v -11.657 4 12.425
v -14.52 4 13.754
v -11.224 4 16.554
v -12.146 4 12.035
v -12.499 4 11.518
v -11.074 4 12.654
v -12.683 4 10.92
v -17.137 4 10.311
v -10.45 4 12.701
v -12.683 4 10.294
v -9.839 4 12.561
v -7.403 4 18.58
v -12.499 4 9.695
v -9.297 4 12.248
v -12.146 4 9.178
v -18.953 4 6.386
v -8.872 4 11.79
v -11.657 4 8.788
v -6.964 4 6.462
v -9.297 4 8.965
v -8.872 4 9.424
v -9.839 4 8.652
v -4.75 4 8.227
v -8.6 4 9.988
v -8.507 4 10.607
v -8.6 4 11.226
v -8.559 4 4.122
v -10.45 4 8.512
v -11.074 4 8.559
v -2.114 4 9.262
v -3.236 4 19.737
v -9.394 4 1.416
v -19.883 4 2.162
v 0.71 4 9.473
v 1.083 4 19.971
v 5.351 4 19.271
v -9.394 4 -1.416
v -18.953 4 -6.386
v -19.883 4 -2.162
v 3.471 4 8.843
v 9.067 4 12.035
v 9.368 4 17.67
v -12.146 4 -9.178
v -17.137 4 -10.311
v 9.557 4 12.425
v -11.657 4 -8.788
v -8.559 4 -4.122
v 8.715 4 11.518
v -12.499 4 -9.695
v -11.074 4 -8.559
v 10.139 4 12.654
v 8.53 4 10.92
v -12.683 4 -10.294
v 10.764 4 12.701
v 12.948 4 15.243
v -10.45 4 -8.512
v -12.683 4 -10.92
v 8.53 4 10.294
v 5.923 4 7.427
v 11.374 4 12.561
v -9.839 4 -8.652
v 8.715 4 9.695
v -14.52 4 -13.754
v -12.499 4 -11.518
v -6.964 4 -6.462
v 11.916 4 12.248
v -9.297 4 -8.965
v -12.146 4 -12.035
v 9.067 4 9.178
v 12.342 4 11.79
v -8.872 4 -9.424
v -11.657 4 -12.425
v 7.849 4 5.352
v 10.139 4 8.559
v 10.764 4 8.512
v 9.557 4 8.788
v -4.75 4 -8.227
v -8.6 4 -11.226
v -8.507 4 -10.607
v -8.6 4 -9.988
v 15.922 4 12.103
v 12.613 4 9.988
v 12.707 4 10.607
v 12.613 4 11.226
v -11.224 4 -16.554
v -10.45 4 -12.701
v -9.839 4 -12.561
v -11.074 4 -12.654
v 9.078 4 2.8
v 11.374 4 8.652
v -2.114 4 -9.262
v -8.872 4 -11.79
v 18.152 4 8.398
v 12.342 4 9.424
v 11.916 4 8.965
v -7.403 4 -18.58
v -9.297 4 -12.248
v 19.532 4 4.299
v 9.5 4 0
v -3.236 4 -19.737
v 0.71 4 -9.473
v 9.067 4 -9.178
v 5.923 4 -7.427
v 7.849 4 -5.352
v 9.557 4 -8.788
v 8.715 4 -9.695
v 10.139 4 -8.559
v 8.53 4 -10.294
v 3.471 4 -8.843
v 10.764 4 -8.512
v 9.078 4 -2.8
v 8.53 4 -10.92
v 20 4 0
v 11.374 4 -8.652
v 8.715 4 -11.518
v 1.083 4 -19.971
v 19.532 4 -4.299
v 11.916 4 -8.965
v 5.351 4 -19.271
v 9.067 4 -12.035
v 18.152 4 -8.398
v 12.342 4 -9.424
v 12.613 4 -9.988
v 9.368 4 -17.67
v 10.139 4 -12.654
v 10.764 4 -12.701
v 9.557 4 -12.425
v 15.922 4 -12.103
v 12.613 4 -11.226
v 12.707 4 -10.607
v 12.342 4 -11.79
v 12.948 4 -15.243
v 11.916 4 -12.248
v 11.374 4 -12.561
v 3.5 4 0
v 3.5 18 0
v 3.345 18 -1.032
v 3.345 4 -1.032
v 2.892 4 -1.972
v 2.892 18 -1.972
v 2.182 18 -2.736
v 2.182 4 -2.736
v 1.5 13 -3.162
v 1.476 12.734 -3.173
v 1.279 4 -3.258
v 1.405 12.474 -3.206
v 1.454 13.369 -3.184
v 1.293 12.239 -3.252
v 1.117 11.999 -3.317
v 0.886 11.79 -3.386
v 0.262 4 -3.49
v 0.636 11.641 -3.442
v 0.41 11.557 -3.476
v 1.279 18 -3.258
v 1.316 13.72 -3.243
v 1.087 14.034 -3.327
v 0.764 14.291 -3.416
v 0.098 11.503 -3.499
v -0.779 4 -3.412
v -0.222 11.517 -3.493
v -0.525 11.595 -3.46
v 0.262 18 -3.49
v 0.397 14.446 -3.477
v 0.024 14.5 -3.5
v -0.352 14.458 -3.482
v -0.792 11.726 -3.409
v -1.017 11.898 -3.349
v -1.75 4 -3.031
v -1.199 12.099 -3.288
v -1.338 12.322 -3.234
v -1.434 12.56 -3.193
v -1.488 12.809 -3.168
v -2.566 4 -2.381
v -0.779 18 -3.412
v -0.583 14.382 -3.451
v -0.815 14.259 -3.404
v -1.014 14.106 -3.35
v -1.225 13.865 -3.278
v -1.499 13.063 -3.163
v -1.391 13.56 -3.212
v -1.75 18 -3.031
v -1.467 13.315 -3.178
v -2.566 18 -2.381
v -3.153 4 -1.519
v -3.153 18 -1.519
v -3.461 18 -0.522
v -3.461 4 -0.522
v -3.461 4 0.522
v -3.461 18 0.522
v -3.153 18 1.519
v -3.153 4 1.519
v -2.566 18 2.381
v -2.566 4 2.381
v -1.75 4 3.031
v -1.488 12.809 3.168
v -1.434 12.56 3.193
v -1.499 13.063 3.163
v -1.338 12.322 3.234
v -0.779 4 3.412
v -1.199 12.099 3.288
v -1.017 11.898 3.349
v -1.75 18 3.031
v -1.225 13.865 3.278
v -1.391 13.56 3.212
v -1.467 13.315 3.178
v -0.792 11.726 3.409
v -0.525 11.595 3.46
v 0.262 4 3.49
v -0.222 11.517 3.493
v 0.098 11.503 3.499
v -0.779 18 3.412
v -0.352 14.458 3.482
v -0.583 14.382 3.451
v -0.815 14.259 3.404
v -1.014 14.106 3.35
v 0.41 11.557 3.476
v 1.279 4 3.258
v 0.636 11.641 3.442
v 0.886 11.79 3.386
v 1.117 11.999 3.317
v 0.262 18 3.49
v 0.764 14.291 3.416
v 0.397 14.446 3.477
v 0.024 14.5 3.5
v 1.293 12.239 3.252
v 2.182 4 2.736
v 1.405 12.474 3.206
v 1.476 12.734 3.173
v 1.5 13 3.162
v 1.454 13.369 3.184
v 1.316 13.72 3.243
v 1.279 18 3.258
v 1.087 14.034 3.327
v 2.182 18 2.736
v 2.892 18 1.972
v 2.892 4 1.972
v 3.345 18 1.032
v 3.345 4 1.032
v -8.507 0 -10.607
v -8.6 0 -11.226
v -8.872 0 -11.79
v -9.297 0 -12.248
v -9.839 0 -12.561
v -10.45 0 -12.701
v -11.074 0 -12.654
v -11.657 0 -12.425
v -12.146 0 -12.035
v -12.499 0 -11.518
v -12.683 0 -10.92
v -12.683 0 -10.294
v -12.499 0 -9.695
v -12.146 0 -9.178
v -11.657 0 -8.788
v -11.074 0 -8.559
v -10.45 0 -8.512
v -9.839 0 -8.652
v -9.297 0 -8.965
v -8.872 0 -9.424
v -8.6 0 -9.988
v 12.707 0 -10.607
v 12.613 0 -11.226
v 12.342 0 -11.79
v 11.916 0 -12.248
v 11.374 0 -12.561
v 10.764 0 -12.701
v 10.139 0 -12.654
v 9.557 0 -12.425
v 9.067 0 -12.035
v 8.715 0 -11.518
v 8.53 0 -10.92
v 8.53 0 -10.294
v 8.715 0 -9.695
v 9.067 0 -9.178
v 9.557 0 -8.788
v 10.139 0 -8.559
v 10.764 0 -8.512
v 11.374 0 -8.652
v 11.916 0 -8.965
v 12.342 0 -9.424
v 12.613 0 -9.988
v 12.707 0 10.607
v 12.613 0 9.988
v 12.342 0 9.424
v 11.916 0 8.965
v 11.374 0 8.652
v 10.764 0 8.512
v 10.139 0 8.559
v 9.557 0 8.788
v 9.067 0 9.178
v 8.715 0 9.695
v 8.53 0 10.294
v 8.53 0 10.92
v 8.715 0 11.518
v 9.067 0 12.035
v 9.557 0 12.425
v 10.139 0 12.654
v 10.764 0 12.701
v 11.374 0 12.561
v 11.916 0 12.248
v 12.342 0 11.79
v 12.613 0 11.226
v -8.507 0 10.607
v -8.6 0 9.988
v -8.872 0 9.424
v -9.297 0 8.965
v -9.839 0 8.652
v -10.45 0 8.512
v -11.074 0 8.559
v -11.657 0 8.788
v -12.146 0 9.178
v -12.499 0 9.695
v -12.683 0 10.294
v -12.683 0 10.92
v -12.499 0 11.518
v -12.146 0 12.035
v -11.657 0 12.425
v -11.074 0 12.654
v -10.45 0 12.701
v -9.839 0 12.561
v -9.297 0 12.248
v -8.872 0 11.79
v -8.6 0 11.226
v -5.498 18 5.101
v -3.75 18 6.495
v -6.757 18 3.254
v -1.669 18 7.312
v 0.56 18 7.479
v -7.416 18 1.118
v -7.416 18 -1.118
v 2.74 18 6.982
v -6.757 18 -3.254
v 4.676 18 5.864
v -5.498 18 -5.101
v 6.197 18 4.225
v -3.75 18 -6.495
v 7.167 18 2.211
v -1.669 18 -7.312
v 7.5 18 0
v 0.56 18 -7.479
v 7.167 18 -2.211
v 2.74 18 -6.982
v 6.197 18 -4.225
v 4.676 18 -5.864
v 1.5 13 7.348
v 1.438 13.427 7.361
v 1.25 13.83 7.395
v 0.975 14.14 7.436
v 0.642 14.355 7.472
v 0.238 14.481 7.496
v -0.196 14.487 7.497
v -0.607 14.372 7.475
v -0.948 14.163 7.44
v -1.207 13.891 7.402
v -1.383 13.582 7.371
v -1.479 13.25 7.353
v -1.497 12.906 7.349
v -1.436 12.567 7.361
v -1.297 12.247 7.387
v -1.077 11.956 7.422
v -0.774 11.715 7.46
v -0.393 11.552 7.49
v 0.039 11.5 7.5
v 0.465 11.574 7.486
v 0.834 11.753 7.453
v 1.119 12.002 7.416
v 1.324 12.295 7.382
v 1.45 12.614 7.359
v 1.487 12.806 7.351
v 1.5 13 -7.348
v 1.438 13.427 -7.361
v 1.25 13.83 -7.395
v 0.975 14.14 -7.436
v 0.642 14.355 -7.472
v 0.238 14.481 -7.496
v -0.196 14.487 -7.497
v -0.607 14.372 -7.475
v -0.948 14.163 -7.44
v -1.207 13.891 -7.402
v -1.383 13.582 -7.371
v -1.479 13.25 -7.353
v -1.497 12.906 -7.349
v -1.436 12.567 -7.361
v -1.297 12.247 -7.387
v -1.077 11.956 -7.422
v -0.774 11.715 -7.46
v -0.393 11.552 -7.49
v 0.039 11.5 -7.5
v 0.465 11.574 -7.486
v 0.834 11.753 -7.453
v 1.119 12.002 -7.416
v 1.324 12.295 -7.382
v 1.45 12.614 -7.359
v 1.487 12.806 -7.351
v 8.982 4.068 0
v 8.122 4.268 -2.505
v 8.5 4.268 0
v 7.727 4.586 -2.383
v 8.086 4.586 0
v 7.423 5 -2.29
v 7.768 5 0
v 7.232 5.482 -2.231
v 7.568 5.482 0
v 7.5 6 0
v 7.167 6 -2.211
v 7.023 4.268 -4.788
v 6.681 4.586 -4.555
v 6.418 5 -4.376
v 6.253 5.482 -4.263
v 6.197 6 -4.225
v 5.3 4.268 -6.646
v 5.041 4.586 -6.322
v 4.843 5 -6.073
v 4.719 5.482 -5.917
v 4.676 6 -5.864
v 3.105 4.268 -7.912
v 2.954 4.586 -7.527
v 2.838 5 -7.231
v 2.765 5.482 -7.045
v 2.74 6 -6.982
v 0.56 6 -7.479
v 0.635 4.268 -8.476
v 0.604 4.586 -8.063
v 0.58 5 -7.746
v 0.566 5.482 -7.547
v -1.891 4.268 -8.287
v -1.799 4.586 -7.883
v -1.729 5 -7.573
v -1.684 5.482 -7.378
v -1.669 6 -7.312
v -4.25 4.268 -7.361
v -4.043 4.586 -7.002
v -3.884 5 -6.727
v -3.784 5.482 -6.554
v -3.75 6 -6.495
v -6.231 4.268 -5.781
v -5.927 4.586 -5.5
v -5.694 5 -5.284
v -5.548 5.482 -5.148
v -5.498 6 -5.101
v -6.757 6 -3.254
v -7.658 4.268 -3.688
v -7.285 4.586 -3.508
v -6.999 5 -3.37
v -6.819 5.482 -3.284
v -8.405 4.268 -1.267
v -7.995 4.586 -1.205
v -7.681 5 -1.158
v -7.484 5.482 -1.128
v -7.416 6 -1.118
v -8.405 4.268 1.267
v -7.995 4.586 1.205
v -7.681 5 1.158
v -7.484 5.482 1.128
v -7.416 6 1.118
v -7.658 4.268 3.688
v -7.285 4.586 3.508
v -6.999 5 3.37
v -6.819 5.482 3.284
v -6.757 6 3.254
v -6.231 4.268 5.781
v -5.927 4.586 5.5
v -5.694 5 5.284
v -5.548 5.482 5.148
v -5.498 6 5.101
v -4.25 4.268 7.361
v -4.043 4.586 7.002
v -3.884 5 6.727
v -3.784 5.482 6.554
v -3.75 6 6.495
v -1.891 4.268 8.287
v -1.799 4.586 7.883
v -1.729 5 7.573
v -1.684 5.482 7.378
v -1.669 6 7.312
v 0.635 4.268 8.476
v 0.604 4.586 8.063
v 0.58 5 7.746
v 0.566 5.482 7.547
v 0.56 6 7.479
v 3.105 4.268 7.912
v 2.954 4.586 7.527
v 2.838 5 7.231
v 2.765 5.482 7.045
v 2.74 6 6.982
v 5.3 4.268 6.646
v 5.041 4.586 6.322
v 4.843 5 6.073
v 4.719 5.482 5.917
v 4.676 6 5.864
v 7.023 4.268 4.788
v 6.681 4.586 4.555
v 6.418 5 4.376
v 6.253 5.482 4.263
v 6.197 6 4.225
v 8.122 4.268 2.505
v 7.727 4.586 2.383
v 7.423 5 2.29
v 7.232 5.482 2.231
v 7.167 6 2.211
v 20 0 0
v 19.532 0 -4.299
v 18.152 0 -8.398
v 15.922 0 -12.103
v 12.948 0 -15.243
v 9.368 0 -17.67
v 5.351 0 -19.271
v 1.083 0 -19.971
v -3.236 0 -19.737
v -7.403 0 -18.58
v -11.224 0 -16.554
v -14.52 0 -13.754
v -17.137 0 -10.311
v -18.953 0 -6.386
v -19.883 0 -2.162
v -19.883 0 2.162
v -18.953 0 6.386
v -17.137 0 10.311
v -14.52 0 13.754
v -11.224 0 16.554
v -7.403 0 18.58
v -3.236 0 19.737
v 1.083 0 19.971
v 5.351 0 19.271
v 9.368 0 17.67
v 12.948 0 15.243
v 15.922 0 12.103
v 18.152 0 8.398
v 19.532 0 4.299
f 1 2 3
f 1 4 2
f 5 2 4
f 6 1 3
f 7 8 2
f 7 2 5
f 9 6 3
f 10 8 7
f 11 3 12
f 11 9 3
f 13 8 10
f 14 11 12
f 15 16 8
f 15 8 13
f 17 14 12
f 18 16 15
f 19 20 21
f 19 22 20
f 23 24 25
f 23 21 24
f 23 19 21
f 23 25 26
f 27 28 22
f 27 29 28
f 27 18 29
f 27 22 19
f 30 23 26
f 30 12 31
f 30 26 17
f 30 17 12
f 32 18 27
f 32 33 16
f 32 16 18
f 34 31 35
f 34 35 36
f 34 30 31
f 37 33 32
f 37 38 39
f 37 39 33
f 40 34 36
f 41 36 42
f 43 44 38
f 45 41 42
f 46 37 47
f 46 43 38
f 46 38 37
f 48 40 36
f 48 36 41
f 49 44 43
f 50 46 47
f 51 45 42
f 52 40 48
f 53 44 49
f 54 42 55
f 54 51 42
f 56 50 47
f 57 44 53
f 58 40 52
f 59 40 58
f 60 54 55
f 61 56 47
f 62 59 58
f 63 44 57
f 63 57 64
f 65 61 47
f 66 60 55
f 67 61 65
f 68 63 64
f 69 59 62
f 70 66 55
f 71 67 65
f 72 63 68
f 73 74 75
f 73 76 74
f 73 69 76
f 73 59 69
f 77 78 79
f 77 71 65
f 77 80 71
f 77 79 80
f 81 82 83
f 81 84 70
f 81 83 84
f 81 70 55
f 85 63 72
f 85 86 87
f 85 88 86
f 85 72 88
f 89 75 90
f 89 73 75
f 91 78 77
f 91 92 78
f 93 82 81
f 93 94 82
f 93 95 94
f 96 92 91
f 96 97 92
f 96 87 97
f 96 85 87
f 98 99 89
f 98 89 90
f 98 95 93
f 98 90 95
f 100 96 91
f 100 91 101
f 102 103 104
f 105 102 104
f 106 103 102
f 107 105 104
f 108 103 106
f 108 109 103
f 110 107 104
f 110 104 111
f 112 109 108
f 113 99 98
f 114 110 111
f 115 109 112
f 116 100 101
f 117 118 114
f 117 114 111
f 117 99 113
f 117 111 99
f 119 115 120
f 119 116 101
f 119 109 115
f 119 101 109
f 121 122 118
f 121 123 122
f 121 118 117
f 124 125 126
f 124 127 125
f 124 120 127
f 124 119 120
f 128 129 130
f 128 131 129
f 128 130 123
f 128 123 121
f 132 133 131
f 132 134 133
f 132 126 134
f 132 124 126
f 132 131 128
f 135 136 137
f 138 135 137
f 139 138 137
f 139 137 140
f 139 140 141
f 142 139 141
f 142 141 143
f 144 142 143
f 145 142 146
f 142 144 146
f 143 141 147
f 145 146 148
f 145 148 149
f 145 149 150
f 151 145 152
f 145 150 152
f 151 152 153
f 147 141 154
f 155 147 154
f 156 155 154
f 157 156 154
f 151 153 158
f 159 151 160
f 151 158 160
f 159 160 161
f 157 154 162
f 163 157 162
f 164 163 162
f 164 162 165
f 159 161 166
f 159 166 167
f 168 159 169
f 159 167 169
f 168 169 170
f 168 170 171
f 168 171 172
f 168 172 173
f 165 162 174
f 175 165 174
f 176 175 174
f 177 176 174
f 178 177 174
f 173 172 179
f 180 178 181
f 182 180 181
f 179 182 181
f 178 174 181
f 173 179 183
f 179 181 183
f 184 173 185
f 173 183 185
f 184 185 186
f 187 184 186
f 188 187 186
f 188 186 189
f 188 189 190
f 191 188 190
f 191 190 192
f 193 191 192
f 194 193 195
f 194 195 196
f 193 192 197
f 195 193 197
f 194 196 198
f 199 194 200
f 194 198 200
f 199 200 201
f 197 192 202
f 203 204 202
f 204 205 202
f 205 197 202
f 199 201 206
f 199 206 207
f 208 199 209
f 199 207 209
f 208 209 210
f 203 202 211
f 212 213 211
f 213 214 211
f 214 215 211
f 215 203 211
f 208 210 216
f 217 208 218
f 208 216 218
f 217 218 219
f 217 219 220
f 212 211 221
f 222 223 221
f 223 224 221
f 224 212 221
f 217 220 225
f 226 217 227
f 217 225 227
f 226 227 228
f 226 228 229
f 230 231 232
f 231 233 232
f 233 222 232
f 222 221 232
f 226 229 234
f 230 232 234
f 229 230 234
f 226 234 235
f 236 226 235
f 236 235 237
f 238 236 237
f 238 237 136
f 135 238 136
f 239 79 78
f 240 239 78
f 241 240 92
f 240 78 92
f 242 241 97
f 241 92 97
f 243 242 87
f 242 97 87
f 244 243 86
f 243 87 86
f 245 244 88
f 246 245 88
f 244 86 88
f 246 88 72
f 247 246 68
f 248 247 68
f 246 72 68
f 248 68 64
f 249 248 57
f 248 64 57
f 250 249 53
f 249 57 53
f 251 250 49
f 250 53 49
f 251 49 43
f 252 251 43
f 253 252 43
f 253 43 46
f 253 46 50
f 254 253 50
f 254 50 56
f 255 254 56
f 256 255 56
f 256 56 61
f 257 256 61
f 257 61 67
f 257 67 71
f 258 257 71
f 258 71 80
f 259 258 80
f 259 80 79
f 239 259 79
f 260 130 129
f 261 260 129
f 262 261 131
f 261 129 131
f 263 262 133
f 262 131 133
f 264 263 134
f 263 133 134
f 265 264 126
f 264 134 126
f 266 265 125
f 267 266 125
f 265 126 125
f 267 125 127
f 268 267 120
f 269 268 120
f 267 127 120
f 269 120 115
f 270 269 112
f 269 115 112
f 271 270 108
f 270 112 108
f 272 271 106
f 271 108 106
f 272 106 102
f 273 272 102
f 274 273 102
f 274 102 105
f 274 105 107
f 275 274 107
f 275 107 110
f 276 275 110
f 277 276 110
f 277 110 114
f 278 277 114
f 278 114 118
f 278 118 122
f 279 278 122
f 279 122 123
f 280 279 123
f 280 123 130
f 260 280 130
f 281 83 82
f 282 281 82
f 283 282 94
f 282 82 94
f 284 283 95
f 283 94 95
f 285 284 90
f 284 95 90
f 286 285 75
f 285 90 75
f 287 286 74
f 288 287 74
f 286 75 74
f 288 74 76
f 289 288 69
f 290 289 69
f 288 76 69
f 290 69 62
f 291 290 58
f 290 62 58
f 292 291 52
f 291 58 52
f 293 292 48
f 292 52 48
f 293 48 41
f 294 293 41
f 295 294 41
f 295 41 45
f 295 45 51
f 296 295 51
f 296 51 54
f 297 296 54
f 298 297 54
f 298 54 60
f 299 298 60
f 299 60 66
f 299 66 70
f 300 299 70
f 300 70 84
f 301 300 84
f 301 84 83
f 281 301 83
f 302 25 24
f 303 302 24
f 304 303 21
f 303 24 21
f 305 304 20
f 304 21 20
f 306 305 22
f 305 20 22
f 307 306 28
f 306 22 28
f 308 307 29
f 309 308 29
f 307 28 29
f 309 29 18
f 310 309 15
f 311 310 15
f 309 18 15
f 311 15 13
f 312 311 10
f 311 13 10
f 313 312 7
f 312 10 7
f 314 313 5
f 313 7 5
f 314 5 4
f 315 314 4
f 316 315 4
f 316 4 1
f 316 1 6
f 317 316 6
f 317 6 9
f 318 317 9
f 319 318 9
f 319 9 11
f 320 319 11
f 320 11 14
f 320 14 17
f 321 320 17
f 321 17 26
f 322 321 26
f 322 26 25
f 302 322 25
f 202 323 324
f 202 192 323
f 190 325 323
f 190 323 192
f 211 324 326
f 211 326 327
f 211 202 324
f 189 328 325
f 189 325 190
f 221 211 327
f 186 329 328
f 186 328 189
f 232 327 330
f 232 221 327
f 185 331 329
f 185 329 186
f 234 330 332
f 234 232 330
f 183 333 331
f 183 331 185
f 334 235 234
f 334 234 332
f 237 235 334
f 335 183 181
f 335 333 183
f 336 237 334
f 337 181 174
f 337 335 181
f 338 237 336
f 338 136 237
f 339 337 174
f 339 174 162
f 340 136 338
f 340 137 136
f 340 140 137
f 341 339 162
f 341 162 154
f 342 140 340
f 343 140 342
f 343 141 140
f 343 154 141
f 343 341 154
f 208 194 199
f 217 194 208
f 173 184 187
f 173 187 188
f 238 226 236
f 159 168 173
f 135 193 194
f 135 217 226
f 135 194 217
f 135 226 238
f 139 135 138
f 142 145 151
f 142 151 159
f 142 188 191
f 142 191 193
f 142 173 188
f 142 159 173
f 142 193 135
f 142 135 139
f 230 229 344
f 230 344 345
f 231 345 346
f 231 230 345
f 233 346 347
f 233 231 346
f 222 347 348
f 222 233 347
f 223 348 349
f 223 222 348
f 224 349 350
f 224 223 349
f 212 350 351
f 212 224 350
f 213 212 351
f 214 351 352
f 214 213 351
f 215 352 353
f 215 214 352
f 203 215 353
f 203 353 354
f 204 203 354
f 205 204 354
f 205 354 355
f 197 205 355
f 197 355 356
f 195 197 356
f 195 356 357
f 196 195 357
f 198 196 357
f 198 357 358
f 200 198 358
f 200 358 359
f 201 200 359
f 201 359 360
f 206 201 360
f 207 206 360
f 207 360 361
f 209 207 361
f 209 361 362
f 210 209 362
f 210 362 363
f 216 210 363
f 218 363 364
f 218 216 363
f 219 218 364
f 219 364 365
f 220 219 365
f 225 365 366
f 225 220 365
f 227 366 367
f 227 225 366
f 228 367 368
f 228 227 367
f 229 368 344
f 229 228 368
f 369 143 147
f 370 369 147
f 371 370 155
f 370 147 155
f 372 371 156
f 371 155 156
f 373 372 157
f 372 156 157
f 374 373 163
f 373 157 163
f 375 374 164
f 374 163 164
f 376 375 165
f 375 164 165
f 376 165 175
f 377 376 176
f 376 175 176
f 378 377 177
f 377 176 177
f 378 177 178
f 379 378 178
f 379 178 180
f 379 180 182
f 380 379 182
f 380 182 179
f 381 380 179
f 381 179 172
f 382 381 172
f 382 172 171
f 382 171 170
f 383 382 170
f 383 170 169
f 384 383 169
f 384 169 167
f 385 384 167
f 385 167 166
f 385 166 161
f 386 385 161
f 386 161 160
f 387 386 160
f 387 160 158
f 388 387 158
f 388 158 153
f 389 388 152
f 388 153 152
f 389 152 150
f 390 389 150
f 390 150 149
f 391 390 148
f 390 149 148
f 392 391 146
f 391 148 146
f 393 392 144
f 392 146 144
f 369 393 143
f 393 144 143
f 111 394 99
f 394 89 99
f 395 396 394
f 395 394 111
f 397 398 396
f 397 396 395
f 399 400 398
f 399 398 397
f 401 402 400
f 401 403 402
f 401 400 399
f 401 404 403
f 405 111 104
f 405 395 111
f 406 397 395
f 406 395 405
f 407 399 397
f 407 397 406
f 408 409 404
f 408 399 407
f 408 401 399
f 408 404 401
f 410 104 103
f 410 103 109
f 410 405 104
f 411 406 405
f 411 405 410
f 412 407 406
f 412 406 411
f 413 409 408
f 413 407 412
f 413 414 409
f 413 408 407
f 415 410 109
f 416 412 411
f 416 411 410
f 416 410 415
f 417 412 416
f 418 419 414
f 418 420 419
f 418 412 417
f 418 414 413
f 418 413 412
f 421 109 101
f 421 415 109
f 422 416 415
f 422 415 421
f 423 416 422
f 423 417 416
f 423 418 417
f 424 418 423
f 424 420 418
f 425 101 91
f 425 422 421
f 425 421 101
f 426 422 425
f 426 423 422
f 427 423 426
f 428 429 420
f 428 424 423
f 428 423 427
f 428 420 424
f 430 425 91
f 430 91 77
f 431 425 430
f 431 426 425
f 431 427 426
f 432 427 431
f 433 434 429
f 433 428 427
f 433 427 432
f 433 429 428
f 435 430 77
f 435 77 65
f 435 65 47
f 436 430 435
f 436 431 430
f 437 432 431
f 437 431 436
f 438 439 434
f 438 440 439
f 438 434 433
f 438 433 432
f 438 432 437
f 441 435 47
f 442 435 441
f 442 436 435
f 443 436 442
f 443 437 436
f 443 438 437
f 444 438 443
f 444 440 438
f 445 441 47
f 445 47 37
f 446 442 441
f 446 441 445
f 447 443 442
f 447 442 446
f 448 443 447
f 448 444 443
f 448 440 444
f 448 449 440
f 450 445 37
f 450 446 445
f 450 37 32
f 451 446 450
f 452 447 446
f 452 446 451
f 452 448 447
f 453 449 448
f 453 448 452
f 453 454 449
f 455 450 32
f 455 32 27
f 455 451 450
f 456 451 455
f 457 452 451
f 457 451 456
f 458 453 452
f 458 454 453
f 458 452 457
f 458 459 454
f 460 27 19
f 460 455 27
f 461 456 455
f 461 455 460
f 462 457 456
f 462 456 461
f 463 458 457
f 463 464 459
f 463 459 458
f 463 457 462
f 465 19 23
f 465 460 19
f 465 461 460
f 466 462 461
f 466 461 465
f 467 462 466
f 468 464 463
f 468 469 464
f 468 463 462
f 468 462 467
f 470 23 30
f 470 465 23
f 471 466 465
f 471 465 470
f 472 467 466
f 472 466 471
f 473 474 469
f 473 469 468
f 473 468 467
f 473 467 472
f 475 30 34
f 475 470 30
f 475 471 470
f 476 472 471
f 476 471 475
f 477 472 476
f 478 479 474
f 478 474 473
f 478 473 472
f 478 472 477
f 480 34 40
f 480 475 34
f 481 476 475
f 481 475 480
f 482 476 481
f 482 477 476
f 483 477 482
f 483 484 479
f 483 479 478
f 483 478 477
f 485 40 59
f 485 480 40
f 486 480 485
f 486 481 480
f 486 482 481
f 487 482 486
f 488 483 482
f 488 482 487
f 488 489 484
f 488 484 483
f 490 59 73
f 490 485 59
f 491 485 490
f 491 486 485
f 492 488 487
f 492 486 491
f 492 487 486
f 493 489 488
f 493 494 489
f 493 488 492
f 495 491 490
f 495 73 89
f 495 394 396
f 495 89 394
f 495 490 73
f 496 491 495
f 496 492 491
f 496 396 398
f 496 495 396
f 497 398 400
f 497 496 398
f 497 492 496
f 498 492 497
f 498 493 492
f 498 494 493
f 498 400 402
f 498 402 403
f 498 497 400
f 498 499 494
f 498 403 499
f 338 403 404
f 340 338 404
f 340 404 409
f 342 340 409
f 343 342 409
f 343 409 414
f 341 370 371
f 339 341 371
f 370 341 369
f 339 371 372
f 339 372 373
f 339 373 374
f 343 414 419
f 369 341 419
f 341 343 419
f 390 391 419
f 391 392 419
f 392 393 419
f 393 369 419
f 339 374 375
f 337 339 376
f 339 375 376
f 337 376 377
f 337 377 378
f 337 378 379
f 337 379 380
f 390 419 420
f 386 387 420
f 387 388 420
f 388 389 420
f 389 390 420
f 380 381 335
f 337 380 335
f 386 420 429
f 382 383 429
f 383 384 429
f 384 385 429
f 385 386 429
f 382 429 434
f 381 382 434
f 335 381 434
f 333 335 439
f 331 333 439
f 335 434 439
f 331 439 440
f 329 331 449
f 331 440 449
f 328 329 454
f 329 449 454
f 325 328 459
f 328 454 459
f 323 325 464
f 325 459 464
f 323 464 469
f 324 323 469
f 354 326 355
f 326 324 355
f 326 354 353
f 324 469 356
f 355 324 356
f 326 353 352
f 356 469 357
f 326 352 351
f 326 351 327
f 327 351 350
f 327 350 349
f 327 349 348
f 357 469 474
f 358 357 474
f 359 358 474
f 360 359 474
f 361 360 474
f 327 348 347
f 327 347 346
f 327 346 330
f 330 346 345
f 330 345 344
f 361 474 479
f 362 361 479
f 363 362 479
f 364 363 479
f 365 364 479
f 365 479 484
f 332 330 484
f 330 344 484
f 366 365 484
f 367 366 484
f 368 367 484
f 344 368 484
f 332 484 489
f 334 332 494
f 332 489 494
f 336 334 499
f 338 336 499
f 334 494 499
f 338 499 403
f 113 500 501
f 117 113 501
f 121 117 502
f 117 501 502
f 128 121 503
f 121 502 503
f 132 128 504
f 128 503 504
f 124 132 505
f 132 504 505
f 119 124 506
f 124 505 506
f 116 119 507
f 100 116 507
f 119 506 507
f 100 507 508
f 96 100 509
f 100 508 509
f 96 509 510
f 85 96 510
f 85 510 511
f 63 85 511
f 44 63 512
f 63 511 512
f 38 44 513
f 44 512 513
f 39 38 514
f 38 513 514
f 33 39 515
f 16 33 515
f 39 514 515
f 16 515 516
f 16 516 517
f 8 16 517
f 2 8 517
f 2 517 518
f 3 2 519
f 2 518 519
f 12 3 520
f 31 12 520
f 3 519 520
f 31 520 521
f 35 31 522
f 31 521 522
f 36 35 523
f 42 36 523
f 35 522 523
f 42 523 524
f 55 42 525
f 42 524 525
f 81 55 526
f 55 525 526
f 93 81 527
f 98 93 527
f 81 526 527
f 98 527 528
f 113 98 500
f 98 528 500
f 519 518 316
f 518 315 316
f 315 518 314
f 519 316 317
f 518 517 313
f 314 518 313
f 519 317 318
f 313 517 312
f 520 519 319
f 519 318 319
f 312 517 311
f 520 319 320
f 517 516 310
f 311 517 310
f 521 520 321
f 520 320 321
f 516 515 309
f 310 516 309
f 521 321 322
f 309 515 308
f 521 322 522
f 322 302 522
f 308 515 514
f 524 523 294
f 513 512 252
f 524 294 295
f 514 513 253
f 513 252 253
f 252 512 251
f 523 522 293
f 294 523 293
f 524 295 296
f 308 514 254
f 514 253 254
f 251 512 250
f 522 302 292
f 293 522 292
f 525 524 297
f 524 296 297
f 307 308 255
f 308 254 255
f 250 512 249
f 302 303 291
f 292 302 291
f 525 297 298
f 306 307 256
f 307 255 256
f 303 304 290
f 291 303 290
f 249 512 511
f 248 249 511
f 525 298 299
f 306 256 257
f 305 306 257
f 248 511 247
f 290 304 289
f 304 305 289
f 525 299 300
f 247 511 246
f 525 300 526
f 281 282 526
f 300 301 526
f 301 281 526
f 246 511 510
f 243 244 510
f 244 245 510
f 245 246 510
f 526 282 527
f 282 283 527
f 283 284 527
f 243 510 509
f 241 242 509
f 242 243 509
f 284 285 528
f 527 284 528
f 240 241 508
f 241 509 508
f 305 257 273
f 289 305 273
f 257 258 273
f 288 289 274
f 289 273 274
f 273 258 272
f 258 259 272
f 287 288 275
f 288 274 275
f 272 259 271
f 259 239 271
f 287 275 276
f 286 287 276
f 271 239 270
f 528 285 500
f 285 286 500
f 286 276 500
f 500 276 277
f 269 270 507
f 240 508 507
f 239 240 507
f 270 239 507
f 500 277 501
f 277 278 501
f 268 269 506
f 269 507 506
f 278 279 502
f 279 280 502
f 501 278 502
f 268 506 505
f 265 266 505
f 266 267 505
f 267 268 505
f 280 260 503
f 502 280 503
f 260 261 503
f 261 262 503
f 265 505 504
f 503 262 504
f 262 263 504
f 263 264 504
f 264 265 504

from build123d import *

# Parameters (mm, degrees)
SKETCH1_R               = 20
BOSS_EXTRUDE1_DEPTH     = 4
SKETCH2_R               = 7.5
BOSS_EXTRUDE2_DEPTH     = 14
SKETCH3_R               = 3.5
CUT_EXTRUDE1_DEPTH      = 14
SKETCH5_R               = 1.5
CUT_EXTRUDE2_DEPTH      = 21
CUT_EXTRUDE2_DEPTH_BACK = 21
FILLET1_R               = 2
SKETCH6_R               = 2.1
CUT_EXTRUDE3_DEPTH      = 5


with BuildPart() as part:
    # Sketch1 → Boss-Extrude1 (new body)
    with BuildSketch(Plane(origin=(0, 0, 0), x_dir=(1, 0, 0), z_dir=(0, 1, 0))):
        Circle(SKETCH1_R)
    extrude(amount=BOSS_EXTRUDE1_DEPTH)

    # Sketch2 → Boss-Extrude2 (add)
    with BuildSketch(Plane(origin=(0, 4, 0), x_dir=(1, 0, 0), z_dir=(0, 1, 0))):
        Circle(SKETCH2_R)
    extrude(amount=BOSS_EXTRUDE2_DEPTH)

    # Sketch3 → Cut-Extrude1 (cut)
    with BuildSketch(Plane(origin=(0, 18, 0), x_dir=(1, 0, 0), z_dir=(0, 1, 0))):
        Circle(SKETCH3_R)
    extrude(amount=-CUT_EXTRUDE1_DEPTH, mode=Mode.SUBTRACT)

    # Sketch5 → Cut-Extrude2 (cut, two sides)
    with BuildSketch(Plane.XY) as cut_extrude2_sk:
        with Locations((0, 13)):
            Circle(SKETCH5_R)
    extrude(amount=CUT_EXTRUDE2_DEPTH, mode=Mode.SUBTRACT)
    extrude(cut_extrude2_sk.sketch, amount=-CUT_EXTRUDE2_DEPTH_BACK, mode=Mode.SUBTRACT)

    # Fillet1
    fillet1_edges = [part.edges().sort_by_distance(p)[0] for p in [
        (-7.5, 4, 0),
    ]]
    fillet(fillet1_edges, radius=FILLET1_R)

    # Sketch6 → Cut-Extrude3 (cut, through all)
    with BuildSketch(Plane(origin=(0, 4, 0), x_dir=(1, 0, 0), z_dir=(0, 1, 0))):
        with Locations((10.606601718, 10.606601718)):
            Circle(SKETCH6_R)
        with Locations((-10.606601718, 10.606601718)):
            Circle(SKETCH6_R)
        with Locations((-10.606601718, -10.606601718)):
            Circle(SKETCH6_R)
        with Locations((10.606601718, -10.606601718)):
            Circle(SKETCH6_R)
    extrude(amount=-CUT_EXTRUDE3_DEPTH, mode=Mode.SUBTRACT)


solid = part.part
